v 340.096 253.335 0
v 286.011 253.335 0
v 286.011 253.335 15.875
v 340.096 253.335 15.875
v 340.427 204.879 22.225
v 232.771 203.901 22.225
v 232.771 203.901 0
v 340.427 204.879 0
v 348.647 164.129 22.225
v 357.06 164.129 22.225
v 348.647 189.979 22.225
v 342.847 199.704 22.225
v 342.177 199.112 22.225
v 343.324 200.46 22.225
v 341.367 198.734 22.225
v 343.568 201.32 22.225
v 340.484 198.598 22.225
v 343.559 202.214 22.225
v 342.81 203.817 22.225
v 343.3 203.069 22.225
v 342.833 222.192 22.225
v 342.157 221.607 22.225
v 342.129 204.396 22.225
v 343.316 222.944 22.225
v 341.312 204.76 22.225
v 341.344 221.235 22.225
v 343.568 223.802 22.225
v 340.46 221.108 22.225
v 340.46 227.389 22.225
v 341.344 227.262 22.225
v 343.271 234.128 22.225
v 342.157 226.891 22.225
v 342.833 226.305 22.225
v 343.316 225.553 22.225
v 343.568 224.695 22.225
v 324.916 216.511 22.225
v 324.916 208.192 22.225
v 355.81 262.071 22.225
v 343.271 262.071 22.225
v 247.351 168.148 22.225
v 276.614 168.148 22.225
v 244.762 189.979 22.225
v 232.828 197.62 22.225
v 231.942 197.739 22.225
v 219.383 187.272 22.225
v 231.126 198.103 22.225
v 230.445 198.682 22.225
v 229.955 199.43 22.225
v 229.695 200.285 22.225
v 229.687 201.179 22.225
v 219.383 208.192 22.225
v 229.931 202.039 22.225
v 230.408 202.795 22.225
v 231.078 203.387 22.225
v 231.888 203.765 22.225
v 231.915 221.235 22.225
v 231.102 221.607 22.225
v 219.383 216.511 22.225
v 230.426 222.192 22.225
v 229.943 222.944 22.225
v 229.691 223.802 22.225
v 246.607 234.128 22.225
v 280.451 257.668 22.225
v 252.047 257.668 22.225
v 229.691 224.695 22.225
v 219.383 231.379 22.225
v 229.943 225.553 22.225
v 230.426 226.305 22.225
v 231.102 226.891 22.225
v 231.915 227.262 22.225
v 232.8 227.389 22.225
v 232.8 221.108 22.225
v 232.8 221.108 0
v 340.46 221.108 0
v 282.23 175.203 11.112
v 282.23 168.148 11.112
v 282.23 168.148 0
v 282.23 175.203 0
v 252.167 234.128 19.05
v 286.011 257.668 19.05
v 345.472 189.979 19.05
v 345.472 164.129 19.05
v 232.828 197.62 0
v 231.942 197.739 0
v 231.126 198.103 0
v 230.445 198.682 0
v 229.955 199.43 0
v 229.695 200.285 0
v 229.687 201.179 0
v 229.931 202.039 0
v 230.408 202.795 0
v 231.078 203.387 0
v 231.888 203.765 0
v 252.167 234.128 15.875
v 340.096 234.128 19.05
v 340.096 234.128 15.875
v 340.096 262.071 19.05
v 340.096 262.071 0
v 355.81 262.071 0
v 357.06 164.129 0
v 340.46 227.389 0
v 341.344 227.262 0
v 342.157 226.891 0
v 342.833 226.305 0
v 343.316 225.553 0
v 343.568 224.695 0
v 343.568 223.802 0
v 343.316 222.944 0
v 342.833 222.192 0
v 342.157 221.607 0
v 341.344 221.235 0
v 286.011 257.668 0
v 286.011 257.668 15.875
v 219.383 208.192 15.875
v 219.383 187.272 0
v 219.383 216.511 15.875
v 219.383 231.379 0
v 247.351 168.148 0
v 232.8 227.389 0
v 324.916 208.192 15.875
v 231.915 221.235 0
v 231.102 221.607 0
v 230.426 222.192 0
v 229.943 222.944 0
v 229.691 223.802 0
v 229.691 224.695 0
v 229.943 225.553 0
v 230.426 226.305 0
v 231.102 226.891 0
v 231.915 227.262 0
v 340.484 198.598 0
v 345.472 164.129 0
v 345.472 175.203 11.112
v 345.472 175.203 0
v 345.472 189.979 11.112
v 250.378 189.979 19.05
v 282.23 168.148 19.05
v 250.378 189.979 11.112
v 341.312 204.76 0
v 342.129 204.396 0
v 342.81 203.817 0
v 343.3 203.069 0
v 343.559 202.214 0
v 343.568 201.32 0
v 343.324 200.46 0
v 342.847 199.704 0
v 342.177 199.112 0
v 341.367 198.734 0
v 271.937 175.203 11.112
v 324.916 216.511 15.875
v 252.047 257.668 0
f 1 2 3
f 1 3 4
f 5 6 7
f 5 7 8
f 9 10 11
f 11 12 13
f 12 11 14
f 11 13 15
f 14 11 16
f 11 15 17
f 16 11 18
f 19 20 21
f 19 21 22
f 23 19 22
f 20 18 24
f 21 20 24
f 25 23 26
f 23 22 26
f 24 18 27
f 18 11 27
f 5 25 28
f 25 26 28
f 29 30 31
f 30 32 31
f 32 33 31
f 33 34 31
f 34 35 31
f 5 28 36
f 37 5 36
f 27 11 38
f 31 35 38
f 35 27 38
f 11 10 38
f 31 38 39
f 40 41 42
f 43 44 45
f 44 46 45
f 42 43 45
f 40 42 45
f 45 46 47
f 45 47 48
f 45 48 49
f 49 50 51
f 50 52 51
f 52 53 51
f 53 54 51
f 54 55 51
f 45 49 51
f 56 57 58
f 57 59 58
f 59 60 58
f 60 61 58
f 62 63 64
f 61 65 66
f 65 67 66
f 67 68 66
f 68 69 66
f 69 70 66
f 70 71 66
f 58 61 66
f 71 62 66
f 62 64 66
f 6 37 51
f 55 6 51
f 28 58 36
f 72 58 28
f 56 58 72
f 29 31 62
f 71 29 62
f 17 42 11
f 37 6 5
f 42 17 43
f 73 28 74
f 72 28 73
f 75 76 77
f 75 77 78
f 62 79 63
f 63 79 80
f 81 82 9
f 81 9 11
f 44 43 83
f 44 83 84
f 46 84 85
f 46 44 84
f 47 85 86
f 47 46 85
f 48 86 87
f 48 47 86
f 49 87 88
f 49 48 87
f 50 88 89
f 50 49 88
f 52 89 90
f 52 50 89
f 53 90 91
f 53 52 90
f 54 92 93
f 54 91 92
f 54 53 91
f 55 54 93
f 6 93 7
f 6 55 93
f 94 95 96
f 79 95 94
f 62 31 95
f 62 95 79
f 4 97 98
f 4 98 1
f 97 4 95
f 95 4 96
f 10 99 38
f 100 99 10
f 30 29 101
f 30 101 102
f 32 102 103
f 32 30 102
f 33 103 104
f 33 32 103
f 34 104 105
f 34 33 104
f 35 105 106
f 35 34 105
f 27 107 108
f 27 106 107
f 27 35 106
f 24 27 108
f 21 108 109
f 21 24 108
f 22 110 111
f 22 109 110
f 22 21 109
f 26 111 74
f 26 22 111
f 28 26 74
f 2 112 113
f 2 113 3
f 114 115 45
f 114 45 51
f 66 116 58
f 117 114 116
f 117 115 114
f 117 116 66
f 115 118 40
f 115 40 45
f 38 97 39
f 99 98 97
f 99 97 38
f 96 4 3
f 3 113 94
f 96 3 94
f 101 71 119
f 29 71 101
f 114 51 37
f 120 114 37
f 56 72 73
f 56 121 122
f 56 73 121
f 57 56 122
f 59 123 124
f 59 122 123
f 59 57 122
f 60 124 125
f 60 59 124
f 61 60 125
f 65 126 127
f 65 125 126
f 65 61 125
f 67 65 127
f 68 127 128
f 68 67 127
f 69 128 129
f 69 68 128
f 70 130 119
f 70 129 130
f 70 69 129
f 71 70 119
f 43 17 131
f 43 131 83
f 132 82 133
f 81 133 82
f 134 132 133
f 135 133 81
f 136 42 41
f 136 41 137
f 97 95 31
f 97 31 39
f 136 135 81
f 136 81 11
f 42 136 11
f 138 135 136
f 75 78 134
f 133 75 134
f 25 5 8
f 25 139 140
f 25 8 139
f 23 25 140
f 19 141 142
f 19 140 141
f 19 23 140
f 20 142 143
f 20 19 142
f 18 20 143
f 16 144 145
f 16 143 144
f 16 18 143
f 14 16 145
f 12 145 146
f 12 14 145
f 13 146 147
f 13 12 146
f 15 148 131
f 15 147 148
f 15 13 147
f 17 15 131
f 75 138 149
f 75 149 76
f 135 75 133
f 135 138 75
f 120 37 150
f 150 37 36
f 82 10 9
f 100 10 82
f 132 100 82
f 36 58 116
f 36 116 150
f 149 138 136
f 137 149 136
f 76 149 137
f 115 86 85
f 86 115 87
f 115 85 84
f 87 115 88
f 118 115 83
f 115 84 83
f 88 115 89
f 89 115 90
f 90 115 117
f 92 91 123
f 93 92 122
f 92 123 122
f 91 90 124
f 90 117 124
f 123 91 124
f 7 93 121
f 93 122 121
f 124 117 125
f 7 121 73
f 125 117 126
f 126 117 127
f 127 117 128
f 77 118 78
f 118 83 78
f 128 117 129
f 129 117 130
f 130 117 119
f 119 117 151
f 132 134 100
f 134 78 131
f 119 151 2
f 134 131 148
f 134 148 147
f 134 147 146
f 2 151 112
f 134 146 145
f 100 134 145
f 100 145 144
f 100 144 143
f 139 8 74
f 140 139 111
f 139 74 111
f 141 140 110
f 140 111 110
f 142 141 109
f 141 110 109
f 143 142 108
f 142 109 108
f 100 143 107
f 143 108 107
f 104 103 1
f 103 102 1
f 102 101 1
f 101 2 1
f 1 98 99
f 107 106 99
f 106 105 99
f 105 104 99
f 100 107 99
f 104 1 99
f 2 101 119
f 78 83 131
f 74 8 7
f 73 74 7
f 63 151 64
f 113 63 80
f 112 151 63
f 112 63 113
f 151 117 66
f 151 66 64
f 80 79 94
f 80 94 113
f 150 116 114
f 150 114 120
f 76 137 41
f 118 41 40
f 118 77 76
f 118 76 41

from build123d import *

# Parameters (mm, degrees)
BOSS_EXTRUDE1_DEPTH = 22.225
SKETCH2_W           = 95.09357109
SKETCH2_H           = 14.776094164
BOSS_EXTRUDE2_DEPTH = 11.1125
SKETCH3_W           = 105.533171411
SKETCH3_H           = 8.318821745
CUT_EXTRUDE1_DEPTH  = 6.35
CUT_EXTRUDE2_DEPTH  = 444.471216787
BOSS_EXTRUDE3_DEPTH = 11.1125
CHAMFER1_SIZE       = 3.175


with BuildPart() as part:
    # Sketch1 → Boss-Extrude1 (new body)
    with BuildSketch(Plane.XY):
        Polygon((219.382736593, 187.272406651), (219.382736593, 231.378695124), (252.047484341, 257.668279987), (286.011346283, 257.668279987), (286.011346283, 253.335489362), (340.095731947, 253.335489362), (340.095731947, 257.668279987), (340.095731947, 262.071092462), (355.810019244, 262.071092462), (357.059535637, 164.129151492), (345.471646064, 164.129151492), (345.471646064, 189.97898492), (250.378074974, 189.97898492), (282.230145695, 168.148416333), (247.35103376, 168.148416333), align=None)
    extrude(amount=BOSS_EXTRUDE1_DEPTH)

    # Sketch2 → Boss-Extrude2 (add)
    with BuildSketch(Plane.XY):
        with Locations((297.924860519, 182.590937838)):
            Rectangle(SKETCH2_W, SKETCH2_H)
    extrude(amount=BOSS_EXTRUDE2_DEPTH)

    # Sketch3 → Cut-Extrude1 (cut)
    with BuildSketch(Plane.XY.offset(22.225)):
        with Locations((272.149322299, 212.351794066)):
            Rectangle(SKETCH3_W, SKETCH3_H)
        Polygon((340.095731947, 253.335489362), (340.095731947, 234.12753334), (252.166996271, 234.12753334), (286.011346283, 257.668279987), align=None)
    extrude(amount=-CUT_EXTRUDE1_DEPTH, mode=Mode.SUBTRACT)

    # Sketch4 → Cut-Extrude2 (cut, through all)
    with BuildSketch(Plane.XY.offset(22.225)):
        with BuildLine():
            Line((232.799757397, 227.389091829), (340.459546105, 227.389091829))
            ThreePointArc((340.459546105, 227.389091829), (343.600105184, 224.24853275), (340.459546105, 221.107973671))
            Line((340.459546105, 221.107973671), (232.799757397, 221.107973671))
            ThreePointArc((232.799757397, 221.107973671), (229.659198318, 224.24853275), (232.799757397, 227.389091829))
        make_face()
        with BuildLine():
            Line((232.771208039, 203.900524193), (340.426548272, 204.879209104))
            ThreePointArc((340.426548272, 204.879209104), (343.595526941, 201.76732915), (340.483646987, 198.598350481))
            Line((340.483646987, 198.598350481), (232.828306754, 197.619665569))
            ThreePointArc((232.828306754, 197.619665569), (229.659328085, 200.731545524), (232.771208039, 203.900524193))
        make_face()
    extrude(amount=-CUT_EXTRUDE2_DEPTH, mode=Mode.SUBTRACT)

    # Sketch5 → Boss-Extrude3 (add)
    with BuildSketch(Plane.XY.offset(11.1125)):
        Polygon((282.230145695, 168.148416333), (282.230145695, 175.202890756), (271.937256742, 175.202890756), align=None)
    extrude(amount=-BOSS_EXTRUDE3_DEPTH)

    # Chamfer1
    chamfer1_edges = [part.edges().sort_by_distance(p)[0] for p in [
        (340.095731947, 248.099312901, 22.225),
        (345.471646064, 177.054068206, 22.225),
        (266.304110334, 179.063700626, 22.225),
        (269.089171277, 245.897906663, 22.225),
    ]]
    chamfer(chamfer1_edges, length=CHAMFER1_SIZE)


solid = part.part
